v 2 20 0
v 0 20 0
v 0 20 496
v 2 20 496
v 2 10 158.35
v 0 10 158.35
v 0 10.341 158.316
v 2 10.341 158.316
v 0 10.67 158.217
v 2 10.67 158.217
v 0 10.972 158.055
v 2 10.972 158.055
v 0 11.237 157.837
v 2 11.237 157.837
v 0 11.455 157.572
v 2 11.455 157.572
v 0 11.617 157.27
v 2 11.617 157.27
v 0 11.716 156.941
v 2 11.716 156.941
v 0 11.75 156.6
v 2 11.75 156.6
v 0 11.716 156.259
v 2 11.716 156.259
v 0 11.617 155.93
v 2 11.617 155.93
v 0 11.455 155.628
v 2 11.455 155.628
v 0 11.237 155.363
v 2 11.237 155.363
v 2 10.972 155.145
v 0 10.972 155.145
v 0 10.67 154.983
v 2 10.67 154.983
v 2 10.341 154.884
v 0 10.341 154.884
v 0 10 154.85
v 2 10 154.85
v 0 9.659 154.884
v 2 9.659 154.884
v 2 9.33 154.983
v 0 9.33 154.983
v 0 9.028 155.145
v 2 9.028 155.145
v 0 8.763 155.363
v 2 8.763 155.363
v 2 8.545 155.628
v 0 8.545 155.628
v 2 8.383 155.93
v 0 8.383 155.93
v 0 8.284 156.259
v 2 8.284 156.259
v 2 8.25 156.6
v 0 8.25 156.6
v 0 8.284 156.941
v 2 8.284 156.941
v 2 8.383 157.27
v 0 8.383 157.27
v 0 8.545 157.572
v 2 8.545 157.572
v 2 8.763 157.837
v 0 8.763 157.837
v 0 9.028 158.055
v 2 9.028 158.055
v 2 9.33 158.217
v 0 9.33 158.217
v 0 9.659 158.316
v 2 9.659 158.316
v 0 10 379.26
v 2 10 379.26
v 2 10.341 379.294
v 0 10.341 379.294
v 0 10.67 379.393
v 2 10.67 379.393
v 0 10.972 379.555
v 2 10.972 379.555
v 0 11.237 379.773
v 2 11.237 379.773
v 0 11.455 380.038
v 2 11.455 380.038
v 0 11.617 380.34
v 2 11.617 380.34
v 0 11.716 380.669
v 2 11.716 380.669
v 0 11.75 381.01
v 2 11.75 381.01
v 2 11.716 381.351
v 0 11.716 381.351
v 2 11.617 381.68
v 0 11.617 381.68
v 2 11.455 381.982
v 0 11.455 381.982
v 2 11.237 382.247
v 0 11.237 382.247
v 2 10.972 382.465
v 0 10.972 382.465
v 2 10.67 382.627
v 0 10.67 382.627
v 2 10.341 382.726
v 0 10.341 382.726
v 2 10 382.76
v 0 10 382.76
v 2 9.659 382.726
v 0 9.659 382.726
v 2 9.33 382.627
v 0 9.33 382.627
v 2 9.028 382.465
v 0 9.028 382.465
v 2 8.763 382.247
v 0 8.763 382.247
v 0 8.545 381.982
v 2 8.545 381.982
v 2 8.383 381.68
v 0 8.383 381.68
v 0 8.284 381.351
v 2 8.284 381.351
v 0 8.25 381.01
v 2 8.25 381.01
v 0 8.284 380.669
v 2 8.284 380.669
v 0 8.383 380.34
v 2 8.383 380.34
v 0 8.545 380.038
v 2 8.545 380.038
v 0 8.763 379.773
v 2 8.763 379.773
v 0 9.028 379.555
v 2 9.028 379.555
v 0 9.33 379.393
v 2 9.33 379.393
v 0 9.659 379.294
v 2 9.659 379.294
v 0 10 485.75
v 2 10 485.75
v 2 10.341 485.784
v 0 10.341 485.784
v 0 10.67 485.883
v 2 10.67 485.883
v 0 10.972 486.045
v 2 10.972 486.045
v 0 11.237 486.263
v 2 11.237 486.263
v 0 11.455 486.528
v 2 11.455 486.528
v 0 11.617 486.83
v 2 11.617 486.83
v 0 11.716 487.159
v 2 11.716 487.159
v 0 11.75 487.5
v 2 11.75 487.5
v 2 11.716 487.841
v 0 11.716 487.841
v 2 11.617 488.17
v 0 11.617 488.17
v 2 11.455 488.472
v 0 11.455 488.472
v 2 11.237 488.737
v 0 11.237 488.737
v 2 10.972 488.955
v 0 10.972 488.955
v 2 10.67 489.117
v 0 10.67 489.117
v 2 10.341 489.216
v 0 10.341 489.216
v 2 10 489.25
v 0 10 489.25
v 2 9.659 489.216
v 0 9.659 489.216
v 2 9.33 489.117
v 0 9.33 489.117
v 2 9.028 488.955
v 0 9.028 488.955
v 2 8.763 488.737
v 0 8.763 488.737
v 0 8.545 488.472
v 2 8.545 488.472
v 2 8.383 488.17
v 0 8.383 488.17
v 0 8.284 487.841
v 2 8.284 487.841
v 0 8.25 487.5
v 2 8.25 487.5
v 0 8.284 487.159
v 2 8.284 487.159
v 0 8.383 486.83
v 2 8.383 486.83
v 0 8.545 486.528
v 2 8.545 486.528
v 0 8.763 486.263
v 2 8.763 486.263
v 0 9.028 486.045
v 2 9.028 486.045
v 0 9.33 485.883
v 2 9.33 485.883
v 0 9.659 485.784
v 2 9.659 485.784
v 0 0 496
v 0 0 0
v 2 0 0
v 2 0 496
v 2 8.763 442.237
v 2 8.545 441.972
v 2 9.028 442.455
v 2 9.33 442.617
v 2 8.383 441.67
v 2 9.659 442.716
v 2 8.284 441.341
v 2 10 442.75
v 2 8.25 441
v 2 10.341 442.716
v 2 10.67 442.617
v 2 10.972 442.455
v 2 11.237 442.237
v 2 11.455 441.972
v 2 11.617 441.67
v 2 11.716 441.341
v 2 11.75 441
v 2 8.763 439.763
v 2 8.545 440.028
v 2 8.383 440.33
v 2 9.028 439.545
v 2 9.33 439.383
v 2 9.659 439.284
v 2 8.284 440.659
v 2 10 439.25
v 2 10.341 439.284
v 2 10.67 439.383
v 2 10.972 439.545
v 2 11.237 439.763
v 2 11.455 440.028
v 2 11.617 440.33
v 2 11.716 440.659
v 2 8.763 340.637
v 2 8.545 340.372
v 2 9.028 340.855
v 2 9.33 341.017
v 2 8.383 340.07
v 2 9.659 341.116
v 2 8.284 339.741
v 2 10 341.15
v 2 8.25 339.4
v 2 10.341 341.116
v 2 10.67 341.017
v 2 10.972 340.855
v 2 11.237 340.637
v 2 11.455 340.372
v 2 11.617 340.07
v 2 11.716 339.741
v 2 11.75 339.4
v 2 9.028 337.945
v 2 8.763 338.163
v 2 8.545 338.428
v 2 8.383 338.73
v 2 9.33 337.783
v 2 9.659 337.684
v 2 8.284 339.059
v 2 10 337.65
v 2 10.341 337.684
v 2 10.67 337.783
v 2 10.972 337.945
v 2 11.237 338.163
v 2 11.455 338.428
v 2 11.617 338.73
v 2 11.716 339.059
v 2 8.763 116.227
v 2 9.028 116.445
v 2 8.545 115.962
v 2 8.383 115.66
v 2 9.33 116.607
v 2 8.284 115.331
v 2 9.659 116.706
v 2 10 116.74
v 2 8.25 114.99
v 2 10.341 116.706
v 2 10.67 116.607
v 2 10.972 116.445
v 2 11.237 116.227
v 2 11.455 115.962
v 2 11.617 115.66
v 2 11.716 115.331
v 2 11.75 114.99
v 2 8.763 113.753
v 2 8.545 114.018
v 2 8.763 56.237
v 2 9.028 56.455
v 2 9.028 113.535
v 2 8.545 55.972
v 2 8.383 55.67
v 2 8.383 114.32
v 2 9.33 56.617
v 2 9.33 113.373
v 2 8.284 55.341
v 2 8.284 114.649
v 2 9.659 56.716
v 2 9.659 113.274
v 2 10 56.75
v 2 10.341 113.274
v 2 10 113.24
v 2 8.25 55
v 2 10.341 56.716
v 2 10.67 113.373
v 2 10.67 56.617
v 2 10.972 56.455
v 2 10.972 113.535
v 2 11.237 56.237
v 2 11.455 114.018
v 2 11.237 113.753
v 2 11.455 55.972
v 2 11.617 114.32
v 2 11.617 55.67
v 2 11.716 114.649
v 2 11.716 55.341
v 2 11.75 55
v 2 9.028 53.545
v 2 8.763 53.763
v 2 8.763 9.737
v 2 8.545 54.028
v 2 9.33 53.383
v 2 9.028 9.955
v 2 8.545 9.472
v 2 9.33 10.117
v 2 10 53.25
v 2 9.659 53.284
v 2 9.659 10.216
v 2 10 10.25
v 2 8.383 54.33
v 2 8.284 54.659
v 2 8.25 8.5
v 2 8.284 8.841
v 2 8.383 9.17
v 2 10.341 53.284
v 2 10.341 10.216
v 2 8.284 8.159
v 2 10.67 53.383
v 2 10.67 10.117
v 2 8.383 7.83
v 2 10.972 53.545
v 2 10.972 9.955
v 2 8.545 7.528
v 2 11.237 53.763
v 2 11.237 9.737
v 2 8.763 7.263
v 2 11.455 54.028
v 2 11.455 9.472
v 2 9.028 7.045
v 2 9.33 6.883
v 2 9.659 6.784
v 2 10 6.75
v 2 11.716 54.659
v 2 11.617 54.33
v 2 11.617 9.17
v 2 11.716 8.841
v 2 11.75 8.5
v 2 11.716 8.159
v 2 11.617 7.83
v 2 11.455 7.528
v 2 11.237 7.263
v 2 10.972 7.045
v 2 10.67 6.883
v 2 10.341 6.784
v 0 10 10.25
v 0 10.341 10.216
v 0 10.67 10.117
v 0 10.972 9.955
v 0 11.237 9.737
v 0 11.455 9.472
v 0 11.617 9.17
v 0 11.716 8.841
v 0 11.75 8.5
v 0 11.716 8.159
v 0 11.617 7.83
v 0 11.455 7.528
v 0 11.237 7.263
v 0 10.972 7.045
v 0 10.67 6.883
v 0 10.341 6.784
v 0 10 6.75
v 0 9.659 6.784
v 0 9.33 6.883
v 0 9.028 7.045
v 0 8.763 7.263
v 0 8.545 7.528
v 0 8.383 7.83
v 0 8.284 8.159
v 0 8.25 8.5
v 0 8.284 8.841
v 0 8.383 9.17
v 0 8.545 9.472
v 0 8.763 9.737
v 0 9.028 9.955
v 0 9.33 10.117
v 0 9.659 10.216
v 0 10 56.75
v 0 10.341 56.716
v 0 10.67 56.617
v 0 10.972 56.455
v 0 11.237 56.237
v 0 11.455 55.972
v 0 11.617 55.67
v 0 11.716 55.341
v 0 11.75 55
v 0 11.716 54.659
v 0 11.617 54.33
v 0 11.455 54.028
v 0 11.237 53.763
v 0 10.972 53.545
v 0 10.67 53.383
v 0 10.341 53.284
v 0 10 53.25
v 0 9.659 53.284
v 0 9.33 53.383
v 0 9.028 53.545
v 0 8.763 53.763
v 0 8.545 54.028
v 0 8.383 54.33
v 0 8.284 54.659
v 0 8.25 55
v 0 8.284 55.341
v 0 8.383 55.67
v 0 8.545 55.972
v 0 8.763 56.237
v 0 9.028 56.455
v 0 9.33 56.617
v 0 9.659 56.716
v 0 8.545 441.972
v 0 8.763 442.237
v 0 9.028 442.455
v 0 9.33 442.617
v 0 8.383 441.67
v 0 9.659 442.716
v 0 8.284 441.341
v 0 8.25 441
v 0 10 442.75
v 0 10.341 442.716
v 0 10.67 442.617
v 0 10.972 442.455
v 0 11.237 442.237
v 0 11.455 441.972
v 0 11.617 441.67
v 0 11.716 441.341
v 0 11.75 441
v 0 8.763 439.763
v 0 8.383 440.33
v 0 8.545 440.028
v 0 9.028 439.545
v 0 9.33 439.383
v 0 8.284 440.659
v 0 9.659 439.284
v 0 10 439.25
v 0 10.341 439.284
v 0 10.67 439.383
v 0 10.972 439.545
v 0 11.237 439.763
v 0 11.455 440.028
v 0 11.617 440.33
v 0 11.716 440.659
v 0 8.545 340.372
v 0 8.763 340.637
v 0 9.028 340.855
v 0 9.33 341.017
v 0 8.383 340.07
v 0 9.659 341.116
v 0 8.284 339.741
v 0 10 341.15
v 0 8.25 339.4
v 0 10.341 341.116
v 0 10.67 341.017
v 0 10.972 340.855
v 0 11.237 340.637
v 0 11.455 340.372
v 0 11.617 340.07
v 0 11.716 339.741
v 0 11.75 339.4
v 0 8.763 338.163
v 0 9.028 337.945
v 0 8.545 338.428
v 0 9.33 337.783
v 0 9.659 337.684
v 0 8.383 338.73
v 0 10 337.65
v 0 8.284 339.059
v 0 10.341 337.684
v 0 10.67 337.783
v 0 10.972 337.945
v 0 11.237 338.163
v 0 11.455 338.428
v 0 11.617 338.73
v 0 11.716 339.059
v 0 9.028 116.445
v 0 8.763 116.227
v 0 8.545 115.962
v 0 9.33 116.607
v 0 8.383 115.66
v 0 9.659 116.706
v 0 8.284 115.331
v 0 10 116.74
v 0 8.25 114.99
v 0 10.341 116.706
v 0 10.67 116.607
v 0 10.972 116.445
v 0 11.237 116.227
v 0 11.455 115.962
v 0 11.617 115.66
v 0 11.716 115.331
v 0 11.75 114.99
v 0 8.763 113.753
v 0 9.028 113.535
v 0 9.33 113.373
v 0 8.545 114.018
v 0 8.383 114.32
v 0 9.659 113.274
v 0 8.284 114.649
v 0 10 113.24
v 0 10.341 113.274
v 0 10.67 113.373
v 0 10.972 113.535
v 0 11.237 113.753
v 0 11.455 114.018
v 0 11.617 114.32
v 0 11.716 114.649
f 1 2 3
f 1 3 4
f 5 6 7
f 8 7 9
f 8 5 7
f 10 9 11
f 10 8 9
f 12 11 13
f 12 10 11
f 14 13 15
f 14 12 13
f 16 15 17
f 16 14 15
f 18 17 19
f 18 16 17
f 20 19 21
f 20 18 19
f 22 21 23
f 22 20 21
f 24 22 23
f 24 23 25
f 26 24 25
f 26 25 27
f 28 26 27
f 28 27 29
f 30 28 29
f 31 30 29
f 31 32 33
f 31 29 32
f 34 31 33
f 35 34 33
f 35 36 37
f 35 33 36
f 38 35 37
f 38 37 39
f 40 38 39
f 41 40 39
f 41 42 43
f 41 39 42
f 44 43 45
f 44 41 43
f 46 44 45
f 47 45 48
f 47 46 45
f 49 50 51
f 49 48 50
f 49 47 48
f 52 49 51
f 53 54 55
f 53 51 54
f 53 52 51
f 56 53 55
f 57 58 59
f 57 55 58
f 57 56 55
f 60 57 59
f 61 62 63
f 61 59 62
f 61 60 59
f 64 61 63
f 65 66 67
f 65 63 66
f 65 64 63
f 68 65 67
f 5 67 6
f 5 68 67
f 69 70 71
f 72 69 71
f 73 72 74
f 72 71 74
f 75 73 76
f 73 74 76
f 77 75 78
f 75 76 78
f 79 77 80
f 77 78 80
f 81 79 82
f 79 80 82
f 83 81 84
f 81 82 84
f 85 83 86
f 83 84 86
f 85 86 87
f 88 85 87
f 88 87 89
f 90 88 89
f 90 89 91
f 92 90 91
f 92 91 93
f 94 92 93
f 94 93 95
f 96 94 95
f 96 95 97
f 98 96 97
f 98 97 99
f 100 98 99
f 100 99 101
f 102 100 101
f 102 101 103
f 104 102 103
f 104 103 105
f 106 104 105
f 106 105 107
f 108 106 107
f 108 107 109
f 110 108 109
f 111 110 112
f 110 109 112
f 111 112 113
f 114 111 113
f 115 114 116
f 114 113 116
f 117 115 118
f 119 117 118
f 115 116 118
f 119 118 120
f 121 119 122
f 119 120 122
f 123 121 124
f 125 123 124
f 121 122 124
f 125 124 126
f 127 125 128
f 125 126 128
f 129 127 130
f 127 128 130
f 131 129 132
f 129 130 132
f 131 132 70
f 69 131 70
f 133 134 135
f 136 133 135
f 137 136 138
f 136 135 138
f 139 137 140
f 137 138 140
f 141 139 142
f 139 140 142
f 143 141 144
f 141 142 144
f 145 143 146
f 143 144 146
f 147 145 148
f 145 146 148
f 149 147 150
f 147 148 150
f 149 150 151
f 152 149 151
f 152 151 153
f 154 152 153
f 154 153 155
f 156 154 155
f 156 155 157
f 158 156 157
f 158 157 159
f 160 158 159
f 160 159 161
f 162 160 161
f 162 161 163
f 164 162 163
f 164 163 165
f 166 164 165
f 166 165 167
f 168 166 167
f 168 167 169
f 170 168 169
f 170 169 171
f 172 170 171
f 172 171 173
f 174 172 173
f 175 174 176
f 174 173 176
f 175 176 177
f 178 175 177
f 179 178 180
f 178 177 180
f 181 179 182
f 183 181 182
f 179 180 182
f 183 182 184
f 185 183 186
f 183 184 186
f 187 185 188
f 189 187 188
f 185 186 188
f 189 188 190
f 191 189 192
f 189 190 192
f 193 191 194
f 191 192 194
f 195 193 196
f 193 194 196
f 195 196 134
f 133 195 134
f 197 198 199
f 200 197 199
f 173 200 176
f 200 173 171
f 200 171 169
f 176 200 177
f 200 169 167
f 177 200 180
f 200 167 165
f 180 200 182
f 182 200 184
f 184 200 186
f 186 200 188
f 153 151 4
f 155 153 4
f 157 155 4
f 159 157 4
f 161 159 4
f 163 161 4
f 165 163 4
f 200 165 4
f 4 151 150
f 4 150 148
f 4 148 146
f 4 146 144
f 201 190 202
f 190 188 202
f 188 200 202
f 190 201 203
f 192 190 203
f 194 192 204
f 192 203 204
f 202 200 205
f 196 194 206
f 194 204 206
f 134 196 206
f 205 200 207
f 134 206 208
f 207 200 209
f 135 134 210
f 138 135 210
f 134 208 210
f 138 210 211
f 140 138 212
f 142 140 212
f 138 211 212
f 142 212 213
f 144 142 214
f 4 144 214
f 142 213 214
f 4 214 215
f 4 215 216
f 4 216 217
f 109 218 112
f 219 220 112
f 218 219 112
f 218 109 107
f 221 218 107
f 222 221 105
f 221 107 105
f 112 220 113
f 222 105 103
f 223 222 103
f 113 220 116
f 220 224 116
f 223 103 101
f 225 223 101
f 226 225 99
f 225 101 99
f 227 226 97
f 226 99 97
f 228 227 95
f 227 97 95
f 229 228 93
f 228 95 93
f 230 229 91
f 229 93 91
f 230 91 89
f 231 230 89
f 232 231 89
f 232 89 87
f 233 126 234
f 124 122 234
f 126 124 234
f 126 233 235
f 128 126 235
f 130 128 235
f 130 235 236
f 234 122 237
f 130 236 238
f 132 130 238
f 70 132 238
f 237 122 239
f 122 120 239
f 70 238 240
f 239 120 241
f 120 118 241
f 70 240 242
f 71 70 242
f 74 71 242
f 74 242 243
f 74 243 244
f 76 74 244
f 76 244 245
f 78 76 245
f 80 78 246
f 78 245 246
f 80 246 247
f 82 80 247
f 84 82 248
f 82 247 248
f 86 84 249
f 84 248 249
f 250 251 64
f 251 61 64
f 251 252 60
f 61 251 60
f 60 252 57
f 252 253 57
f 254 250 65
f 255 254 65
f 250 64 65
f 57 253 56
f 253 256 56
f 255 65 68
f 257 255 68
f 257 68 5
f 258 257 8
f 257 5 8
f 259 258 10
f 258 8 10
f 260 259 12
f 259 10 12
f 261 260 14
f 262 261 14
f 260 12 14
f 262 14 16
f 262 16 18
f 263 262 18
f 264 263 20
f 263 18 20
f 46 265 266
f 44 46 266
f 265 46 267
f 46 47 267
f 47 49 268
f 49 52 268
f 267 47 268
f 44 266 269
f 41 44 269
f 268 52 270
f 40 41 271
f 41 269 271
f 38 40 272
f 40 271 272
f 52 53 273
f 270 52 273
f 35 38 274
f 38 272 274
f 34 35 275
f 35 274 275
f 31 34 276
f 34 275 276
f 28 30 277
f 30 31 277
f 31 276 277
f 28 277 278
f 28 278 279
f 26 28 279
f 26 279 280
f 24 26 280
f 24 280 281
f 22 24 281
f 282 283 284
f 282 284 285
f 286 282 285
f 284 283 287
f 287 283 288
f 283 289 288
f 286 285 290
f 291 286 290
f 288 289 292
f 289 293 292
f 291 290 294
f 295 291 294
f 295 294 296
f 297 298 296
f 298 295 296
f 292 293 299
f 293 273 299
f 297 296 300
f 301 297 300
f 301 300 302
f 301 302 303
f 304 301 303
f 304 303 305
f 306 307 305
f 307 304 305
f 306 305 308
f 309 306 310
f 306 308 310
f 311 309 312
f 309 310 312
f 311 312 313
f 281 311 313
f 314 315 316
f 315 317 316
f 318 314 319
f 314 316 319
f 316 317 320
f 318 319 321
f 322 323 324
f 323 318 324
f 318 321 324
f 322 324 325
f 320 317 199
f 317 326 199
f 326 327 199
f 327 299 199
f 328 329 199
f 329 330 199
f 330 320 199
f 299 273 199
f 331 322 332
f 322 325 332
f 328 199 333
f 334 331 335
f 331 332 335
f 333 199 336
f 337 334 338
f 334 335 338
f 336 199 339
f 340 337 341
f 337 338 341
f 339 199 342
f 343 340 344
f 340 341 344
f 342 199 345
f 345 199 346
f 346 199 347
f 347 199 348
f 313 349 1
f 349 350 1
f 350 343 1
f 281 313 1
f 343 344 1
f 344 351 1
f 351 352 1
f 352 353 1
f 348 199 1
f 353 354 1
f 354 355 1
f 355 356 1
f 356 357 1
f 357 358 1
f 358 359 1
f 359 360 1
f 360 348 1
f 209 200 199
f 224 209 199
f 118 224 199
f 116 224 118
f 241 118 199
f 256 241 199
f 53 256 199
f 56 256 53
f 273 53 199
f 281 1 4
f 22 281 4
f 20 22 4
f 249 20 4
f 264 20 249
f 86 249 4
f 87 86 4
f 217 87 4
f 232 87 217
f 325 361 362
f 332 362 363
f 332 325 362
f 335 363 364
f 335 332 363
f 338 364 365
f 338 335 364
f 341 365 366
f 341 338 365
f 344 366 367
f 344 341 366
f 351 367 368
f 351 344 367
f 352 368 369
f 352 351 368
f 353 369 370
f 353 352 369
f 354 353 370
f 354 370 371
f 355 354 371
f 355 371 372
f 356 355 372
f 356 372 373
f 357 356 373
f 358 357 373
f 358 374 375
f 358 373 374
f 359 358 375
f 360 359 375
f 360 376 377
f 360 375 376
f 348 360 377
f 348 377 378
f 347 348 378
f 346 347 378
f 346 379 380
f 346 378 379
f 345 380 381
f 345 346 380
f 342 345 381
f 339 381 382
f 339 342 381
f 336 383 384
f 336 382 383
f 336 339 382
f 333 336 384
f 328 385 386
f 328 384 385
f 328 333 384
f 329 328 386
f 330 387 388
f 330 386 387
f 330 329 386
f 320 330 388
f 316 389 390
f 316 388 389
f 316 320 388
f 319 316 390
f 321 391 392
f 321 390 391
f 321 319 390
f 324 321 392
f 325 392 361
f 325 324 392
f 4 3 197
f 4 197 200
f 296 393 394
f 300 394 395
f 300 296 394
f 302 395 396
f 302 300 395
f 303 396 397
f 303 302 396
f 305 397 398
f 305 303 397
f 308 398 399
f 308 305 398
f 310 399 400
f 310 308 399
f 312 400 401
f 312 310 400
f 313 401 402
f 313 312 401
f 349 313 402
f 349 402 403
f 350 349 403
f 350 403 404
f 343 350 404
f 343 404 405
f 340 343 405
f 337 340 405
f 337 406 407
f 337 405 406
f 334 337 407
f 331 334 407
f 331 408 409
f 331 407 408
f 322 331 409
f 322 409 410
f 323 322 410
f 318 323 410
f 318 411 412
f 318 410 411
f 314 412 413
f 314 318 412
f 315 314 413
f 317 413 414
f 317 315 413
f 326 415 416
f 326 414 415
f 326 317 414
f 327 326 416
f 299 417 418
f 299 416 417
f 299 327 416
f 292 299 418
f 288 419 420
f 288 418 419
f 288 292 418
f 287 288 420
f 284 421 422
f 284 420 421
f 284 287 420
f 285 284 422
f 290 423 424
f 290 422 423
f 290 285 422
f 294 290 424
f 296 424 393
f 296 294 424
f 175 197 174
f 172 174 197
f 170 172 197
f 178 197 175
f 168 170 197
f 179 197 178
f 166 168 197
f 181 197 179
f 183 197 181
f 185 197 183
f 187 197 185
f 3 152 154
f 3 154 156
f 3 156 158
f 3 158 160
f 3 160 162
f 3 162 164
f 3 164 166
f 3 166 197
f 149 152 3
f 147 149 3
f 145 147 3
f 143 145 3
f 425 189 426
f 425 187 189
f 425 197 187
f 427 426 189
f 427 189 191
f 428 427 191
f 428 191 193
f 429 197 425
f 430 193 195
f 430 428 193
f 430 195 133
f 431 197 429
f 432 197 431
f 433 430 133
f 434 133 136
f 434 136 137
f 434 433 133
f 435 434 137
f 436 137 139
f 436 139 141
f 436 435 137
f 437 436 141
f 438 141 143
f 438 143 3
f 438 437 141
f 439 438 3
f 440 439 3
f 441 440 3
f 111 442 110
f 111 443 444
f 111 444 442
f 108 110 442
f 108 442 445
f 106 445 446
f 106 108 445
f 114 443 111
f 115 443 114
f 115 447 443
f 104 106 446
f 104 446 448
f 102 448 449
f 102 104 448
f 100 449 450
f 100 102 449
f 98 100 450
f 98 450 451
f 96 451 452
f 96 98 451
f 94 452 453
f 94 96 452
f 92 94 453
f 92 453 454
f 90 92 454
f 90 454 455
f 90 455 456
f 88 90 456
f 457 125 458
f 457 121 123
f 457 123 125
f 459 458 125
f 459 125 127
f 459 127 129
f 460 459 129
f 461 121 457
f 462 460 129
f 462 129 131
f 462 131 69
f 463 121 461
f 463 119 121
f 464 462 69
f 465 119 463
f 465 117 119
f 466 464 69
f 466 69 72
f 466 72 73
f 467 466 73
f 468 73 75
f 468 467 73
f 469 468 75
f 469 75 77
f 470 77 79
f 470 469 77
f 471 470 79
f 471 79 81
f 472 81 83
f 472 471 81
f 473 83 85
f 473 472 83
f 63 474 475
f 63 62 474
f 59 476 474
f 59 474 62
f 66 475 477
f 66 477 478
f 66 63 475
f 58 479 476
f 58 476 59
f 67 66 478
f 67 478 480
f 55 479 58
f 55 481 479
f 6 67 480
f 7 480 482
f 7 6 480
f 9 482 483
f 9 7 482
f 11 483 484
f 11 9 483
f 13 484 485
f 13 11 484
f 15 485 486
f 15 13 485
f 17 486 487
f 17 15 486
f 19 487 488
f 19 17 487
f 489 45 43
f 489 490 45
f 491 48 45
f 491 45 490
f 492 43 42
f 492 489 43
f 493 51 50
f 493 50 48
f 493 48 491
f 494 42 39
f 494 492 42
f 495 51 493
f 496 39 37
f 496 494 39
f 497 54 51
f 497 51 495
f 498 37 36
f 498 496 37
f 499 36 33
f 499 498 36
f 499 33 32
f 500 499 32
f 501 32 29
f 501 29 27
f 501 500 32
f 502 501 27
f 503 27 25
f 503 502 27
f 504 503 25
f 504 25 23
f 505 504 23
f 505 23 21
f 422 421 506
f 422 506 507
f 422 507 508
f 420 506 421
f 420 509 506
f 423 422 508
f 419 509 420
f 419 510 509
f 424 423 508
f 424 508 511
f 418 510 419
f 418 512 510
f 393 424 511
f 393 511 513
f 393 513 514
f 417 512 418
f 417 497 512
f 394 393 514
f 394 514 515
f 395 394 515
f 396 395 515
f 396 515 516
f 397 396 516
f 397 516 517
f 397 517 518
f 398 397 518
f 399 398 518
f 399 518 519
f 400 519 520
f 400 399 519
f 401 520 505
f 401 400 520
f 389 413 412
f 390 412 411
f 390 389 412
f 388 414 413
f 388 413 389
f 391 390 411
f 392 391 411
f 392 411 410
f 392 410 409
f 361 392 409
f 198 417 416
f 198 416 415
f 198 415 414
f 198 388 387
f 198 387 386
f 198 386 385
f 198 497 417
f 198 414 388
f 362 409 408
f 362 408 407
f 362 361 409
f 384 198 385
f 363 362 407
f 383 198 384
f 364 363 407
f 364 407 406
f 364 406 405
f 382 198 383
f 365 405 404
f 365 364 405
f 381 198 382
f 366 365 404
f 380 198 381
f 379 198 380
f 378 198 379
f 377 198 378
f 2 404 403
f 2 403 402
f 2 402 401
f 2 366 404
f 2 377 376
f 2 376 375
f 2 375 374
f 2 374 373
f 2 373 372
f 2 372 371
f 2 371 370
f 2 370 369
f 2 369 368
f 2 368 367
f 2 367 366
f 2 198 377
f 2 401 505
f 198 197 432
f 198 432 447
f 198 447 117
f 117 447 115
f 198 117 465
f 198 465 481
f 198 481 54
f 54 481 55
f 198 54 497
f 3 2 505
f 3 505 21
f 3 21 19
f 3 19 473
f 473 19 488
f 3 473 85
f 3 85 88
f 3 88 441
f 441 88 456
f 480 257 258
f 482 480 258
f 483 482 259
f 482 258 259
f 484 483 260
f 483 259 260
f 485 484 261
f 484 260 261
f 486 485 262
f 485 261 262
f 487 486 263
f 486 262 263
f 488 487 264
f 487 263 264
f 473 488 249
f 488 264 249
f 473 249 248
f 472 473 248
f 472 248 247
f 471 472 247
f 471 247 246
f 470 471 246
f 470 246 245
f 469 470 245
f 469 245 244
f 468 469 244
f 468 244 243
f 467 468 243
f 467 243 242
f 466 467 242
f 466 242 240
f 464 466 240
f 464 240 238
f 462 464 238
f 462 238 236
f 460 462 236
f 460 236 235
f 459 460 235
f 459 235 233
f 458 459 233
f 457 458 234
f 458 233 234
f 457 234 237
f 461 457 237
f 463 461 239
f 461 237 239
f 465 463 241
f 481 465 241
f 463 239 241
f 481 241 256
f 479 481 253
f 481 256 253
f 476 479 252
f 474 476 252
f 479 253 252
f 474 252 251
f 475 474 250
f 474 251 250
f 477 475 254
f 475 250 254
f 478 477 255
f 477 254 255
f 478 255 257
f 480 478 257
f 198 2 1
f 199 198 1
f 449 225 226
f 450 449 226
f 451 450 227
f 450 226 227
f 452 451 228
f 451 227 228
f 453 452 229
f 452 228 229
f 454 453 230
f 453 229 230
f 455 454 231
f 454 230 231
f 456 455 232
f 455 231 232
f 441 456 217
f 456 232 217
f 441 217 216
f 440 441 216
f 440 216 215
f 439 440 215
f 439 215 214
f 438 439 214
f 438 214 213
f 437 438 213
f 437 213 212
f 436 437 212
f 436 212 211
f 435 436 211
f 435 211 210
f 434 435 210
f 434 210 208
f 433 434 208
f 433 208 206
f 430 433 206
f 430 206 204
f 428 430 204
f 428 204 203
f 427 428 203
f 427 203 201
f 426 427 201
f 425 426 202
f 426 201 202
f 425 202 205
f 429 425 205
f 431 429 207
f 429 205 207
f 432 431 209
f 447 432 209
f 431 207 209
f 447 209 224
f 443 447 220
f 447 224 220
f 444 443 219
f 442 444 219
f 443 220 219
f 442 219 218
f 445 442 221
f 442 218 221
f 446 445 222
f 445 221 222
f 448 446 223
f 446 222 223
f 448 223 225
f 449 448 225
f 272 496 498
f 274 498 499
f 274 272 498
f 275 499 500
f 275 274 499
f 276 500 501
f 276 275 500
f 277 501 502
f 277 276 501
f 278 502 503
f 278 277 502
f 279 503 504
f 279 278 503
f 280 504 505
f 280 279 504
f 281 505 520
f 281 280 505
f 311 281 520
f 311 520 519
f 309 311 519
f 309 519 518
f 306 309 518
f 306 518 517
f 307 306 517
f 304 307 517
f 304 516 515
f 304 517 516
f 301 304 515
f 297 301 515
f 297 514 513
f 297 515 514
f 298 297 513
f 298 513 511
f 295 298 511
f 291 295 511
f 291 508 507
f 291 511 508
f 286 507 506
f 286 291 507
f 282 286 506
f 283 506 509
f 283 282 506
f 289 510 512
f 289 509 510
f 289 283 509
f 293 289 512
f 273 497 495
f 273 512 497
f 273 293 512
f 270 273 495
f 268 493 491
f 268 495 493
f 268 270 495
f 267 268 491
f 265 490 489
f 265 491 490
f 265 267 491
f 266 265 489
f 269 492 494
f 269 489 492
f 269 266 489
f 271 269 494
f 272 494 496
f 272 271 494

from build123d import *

# Parameters (mm, degrees)
SKETCH_1_W          = 2
SKETCH_1_H          = 20
EXTRUDE_1_DEPTH     = 496
SKETCH_2_R          = 1.75
CUT_EXTRUDE_1_DEPTH = 497.407091005


with BuildPart() as part:
    # Эскиз1 → Бобышка-Вытянуть1 (new body)
    with BuildSketch(Plane.XY):
        with Locations((1, 10)):
            Rectangle(SKETCH_1_W, SKETCH_1_H)
    extrude(amount=EXTRUDE_1_DEPTH)

    # Эскиз2 → Вырез-Вытянуть1 (cut, through all)
    with BuildSketch(Plane(origin=(2, 0, 0), x_dir=(0, 0, -1), z_dir=(1, 0, 0))):
        with Locations((-487.5, 10)):
            Circle(SKETCH_2_R)
        with Locations((-441, 10)):
            Circle(SKETCH_2_R)
        with Locations((-381.01, 10)):
            Circle(SKETCH_2_R)
        with Locations((-339.4, 10)):
            Circle(SKETCH_2_R)
    cut_extrude_1 = extrude(amount=-CUT_EXTRUDE_1_DEPTH, mode=Mode.SUBTRACT)

    # Зеркальное отражение1: Вырез-Вытянуть1 across plane
    add(cut_extrude_1.mirror(Plane(origin=(0, 0, 248), x_dir=(1, 0, 0), z_dir=(0, 0, -1))), mode=Mode.SUBTRACT)


solid = part.part
